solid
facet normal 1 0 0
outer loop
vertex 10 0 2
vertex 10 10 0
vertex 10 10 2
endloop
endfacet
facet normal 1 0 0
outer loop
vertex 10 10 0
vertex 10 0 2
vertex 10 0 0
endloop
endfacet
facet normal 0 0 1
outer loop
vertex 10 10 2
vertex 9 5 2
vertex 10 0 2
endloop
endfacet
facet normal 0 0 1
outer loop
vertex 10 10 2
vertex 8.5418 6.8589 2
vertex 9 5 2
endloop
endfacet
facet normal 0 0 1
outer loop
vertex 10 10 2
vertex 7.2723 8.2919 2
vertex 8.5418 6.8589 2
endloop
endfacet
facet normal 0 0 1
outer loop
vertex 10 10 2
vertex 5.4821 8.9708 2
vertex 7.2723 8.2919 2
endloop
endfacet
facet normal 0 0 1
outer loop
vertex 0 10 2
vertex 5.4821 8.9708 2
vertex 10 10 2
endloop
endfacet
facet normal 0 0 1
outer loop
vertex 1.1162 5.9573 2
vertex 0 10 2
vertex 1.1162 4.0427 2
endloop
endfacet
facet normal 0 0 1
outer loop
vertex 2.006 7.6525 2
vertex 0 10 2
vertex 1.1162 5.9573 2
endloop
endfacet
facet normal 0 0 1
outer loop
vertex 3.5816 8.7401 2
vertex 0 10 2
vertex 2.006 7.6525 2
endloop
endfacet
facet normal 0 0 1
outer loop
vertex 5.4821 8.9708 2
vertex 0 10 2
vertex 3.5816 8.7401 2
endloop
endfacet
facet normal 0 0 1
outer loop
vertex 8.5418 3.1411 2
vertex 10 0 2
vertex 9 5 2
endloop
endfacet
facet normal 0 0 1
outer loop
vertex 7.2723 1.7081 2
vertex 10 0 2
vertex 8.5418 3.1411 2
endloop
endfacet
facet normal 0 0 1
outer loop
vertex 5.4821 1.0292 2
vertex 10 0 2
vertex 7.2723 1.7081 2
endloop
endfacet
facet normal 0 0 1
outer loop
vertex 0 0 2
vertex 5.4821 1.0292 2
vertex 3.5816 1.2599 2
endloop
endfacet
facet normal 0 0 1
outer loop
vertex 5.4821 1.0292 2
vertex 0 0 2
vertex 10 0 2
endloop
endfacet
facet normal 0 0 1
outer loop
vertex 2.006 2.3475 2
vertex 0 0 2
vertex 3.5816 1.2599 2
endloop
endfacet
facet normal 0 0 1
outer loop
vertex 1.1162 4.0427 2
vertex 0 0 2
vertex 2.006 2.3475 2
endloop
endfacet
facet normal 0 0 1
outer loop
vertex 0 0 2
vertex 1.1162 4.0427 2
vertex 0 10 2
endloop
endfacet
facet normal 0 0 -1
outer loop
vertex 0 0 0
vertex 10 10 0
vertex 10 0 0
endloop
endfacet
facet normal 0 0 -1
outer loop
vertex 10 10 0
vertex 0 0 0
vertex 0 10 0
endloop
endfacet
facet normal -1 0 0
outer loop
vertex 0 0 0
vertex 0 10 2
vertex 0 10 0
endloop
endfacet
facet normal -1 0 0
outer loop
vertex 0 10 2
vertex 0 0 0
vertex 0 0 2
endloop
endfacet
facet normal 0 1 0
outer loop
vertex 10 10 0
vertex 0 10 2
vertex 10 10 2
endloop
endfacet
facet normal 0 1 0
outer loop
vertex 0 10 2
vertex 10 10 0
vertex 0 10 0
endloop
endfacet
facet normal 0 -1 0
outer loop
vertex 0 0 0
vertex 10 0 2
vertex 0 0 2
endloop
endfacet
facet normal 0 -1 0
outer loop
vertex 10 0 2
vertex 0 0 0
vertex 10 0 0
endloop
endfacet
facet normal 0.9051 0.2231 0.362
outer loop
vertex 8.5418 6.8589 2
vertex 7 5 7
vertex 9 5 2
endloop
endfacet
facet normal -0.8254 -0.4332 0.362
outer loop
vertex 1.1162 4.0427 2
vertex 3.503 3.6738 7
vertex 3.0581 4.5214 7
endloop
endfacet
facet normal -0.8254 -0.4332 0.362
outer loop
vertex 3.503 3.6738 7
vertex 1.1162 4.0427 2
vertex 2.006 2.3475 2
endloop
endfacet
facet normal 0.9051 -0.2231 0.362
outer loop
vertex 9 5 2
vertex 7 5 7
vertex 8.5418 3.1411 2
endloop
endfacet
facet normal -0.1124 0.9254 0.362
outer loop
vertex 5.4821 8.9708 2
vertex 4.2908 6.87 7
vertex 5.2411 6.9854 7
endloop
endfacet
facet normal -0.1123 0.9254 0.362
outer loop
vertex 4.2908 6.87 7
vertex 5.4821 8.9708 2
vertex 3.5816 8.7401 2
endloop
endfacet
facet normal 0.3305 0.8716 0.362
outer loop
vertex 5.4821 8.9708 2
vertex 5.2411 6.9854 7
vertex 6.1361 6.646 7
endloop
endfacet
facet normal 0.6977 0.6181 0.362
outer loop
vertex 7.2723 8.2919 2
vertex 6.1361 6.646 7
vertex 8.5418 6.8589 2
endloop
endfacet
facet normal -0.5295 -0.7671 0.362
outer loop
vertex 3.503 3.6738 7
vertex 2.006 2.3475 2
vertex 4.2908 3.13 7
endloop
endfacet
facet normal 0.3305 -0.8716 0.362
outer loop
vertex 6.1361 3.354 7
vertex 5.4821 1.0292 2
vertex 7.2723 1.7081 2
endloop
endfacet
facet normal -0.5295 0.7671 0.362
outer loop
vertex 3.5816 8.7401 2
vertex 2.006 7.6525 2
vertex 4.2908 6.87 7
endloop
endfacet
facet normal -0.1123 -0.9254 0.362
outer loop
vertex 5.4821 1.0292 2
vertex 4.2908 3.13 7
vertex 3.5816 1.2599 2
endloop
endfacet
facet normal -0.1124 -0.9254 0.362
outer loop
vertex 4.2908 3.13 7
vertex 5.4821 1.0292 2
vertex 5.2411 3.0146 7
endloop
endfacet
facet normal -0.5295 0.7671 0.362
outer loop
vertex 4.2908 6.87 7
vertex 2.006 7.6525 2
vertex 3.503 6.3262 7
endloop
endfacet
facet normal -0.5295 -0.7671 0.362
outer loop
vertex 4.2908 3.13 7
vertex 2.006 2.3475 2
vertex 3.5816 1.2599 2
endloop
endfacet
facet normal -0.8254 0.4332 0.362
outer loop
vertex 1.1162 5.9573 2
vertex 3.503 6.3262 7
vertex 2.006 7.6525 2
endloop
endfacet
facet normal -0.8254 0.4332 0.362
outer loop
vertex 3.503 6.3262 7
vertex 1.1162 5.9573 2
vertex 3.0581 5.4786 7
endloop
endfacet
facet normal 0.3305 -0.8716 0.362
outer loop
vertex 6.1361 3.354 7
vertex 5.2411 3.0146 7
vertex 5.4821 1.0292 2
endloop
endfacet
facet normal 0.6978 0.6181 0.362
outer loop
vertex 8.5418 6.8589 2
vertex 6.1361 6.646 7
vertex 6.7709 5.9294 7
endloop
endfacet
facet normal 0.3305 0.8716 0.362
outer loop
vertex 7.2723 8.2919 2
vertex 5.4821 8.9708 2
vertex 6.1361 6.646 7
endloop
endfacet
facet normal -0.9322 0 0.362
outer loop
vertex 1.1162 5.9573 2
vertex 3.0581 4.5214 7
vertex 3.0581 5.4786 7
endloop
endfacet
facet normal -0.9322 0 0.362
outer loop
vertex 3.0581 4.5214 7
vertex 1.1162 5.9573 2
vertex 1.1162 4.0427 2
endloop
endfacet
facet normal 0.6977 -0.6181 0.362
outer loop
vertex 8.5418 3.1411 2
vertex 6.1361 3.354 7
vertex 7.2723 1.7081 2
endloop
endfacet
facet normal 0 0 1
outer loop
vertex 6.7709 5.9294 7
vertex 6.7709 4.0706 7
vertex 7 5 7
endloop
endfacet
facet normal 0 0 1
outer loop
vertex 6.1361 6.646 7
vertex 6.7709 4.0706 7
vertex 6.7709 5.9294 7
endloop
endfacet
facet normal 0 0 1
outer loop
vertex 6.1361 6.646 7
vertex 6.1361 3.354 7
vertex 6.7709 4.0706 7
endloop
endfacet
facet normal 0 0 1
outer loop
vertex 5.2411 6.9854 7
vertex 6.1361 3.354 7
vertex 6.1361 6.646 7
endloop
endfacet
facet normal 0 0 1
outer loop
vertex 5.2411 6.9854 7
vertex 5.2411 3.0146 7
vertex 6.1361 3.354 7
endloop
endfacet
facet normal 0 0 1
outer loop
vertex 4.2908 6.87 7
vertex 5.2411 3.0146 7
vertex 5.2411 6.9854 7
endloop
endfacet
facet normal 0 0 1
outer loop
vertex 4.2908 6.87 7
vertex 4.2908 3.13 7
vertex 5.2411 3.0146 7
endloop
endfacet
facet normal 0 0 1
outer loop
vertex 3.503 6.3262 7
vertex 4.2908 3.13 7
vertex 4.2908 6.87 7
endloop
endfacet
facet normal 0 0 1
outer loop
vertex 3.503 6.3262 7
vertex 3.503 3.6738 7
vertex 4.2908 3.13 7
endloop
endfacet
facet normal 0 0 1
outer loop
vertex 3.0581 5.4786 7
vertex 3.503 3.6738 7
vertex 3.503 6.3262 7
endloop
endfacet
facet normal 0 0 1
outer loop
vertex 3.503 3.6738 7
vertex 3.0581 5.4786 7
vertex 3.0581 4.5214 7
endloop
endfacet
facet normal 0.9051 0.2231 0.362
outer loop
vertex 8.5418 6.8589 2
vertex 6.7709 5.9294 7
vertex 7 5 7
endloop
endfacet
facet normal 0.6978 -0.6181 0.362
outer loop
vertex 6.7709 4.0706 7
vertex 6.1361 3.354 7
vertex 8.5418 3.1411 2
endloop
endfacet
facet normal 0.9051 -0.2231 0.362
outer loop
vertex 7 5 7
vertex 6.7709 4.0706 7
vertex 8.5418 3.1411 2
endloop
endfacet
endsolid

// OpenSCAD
// Zweck: modifier ! – nothing but the marked subtree gets evaluated and exported.
cube(50);
translate([100, 0, 0]) ! union() {
    cube([10, 10, 2]);
    translate([5, 5, 2]) cylinder(h = 5, r1 = 4, r2 = 2);
}
sphere(30);
